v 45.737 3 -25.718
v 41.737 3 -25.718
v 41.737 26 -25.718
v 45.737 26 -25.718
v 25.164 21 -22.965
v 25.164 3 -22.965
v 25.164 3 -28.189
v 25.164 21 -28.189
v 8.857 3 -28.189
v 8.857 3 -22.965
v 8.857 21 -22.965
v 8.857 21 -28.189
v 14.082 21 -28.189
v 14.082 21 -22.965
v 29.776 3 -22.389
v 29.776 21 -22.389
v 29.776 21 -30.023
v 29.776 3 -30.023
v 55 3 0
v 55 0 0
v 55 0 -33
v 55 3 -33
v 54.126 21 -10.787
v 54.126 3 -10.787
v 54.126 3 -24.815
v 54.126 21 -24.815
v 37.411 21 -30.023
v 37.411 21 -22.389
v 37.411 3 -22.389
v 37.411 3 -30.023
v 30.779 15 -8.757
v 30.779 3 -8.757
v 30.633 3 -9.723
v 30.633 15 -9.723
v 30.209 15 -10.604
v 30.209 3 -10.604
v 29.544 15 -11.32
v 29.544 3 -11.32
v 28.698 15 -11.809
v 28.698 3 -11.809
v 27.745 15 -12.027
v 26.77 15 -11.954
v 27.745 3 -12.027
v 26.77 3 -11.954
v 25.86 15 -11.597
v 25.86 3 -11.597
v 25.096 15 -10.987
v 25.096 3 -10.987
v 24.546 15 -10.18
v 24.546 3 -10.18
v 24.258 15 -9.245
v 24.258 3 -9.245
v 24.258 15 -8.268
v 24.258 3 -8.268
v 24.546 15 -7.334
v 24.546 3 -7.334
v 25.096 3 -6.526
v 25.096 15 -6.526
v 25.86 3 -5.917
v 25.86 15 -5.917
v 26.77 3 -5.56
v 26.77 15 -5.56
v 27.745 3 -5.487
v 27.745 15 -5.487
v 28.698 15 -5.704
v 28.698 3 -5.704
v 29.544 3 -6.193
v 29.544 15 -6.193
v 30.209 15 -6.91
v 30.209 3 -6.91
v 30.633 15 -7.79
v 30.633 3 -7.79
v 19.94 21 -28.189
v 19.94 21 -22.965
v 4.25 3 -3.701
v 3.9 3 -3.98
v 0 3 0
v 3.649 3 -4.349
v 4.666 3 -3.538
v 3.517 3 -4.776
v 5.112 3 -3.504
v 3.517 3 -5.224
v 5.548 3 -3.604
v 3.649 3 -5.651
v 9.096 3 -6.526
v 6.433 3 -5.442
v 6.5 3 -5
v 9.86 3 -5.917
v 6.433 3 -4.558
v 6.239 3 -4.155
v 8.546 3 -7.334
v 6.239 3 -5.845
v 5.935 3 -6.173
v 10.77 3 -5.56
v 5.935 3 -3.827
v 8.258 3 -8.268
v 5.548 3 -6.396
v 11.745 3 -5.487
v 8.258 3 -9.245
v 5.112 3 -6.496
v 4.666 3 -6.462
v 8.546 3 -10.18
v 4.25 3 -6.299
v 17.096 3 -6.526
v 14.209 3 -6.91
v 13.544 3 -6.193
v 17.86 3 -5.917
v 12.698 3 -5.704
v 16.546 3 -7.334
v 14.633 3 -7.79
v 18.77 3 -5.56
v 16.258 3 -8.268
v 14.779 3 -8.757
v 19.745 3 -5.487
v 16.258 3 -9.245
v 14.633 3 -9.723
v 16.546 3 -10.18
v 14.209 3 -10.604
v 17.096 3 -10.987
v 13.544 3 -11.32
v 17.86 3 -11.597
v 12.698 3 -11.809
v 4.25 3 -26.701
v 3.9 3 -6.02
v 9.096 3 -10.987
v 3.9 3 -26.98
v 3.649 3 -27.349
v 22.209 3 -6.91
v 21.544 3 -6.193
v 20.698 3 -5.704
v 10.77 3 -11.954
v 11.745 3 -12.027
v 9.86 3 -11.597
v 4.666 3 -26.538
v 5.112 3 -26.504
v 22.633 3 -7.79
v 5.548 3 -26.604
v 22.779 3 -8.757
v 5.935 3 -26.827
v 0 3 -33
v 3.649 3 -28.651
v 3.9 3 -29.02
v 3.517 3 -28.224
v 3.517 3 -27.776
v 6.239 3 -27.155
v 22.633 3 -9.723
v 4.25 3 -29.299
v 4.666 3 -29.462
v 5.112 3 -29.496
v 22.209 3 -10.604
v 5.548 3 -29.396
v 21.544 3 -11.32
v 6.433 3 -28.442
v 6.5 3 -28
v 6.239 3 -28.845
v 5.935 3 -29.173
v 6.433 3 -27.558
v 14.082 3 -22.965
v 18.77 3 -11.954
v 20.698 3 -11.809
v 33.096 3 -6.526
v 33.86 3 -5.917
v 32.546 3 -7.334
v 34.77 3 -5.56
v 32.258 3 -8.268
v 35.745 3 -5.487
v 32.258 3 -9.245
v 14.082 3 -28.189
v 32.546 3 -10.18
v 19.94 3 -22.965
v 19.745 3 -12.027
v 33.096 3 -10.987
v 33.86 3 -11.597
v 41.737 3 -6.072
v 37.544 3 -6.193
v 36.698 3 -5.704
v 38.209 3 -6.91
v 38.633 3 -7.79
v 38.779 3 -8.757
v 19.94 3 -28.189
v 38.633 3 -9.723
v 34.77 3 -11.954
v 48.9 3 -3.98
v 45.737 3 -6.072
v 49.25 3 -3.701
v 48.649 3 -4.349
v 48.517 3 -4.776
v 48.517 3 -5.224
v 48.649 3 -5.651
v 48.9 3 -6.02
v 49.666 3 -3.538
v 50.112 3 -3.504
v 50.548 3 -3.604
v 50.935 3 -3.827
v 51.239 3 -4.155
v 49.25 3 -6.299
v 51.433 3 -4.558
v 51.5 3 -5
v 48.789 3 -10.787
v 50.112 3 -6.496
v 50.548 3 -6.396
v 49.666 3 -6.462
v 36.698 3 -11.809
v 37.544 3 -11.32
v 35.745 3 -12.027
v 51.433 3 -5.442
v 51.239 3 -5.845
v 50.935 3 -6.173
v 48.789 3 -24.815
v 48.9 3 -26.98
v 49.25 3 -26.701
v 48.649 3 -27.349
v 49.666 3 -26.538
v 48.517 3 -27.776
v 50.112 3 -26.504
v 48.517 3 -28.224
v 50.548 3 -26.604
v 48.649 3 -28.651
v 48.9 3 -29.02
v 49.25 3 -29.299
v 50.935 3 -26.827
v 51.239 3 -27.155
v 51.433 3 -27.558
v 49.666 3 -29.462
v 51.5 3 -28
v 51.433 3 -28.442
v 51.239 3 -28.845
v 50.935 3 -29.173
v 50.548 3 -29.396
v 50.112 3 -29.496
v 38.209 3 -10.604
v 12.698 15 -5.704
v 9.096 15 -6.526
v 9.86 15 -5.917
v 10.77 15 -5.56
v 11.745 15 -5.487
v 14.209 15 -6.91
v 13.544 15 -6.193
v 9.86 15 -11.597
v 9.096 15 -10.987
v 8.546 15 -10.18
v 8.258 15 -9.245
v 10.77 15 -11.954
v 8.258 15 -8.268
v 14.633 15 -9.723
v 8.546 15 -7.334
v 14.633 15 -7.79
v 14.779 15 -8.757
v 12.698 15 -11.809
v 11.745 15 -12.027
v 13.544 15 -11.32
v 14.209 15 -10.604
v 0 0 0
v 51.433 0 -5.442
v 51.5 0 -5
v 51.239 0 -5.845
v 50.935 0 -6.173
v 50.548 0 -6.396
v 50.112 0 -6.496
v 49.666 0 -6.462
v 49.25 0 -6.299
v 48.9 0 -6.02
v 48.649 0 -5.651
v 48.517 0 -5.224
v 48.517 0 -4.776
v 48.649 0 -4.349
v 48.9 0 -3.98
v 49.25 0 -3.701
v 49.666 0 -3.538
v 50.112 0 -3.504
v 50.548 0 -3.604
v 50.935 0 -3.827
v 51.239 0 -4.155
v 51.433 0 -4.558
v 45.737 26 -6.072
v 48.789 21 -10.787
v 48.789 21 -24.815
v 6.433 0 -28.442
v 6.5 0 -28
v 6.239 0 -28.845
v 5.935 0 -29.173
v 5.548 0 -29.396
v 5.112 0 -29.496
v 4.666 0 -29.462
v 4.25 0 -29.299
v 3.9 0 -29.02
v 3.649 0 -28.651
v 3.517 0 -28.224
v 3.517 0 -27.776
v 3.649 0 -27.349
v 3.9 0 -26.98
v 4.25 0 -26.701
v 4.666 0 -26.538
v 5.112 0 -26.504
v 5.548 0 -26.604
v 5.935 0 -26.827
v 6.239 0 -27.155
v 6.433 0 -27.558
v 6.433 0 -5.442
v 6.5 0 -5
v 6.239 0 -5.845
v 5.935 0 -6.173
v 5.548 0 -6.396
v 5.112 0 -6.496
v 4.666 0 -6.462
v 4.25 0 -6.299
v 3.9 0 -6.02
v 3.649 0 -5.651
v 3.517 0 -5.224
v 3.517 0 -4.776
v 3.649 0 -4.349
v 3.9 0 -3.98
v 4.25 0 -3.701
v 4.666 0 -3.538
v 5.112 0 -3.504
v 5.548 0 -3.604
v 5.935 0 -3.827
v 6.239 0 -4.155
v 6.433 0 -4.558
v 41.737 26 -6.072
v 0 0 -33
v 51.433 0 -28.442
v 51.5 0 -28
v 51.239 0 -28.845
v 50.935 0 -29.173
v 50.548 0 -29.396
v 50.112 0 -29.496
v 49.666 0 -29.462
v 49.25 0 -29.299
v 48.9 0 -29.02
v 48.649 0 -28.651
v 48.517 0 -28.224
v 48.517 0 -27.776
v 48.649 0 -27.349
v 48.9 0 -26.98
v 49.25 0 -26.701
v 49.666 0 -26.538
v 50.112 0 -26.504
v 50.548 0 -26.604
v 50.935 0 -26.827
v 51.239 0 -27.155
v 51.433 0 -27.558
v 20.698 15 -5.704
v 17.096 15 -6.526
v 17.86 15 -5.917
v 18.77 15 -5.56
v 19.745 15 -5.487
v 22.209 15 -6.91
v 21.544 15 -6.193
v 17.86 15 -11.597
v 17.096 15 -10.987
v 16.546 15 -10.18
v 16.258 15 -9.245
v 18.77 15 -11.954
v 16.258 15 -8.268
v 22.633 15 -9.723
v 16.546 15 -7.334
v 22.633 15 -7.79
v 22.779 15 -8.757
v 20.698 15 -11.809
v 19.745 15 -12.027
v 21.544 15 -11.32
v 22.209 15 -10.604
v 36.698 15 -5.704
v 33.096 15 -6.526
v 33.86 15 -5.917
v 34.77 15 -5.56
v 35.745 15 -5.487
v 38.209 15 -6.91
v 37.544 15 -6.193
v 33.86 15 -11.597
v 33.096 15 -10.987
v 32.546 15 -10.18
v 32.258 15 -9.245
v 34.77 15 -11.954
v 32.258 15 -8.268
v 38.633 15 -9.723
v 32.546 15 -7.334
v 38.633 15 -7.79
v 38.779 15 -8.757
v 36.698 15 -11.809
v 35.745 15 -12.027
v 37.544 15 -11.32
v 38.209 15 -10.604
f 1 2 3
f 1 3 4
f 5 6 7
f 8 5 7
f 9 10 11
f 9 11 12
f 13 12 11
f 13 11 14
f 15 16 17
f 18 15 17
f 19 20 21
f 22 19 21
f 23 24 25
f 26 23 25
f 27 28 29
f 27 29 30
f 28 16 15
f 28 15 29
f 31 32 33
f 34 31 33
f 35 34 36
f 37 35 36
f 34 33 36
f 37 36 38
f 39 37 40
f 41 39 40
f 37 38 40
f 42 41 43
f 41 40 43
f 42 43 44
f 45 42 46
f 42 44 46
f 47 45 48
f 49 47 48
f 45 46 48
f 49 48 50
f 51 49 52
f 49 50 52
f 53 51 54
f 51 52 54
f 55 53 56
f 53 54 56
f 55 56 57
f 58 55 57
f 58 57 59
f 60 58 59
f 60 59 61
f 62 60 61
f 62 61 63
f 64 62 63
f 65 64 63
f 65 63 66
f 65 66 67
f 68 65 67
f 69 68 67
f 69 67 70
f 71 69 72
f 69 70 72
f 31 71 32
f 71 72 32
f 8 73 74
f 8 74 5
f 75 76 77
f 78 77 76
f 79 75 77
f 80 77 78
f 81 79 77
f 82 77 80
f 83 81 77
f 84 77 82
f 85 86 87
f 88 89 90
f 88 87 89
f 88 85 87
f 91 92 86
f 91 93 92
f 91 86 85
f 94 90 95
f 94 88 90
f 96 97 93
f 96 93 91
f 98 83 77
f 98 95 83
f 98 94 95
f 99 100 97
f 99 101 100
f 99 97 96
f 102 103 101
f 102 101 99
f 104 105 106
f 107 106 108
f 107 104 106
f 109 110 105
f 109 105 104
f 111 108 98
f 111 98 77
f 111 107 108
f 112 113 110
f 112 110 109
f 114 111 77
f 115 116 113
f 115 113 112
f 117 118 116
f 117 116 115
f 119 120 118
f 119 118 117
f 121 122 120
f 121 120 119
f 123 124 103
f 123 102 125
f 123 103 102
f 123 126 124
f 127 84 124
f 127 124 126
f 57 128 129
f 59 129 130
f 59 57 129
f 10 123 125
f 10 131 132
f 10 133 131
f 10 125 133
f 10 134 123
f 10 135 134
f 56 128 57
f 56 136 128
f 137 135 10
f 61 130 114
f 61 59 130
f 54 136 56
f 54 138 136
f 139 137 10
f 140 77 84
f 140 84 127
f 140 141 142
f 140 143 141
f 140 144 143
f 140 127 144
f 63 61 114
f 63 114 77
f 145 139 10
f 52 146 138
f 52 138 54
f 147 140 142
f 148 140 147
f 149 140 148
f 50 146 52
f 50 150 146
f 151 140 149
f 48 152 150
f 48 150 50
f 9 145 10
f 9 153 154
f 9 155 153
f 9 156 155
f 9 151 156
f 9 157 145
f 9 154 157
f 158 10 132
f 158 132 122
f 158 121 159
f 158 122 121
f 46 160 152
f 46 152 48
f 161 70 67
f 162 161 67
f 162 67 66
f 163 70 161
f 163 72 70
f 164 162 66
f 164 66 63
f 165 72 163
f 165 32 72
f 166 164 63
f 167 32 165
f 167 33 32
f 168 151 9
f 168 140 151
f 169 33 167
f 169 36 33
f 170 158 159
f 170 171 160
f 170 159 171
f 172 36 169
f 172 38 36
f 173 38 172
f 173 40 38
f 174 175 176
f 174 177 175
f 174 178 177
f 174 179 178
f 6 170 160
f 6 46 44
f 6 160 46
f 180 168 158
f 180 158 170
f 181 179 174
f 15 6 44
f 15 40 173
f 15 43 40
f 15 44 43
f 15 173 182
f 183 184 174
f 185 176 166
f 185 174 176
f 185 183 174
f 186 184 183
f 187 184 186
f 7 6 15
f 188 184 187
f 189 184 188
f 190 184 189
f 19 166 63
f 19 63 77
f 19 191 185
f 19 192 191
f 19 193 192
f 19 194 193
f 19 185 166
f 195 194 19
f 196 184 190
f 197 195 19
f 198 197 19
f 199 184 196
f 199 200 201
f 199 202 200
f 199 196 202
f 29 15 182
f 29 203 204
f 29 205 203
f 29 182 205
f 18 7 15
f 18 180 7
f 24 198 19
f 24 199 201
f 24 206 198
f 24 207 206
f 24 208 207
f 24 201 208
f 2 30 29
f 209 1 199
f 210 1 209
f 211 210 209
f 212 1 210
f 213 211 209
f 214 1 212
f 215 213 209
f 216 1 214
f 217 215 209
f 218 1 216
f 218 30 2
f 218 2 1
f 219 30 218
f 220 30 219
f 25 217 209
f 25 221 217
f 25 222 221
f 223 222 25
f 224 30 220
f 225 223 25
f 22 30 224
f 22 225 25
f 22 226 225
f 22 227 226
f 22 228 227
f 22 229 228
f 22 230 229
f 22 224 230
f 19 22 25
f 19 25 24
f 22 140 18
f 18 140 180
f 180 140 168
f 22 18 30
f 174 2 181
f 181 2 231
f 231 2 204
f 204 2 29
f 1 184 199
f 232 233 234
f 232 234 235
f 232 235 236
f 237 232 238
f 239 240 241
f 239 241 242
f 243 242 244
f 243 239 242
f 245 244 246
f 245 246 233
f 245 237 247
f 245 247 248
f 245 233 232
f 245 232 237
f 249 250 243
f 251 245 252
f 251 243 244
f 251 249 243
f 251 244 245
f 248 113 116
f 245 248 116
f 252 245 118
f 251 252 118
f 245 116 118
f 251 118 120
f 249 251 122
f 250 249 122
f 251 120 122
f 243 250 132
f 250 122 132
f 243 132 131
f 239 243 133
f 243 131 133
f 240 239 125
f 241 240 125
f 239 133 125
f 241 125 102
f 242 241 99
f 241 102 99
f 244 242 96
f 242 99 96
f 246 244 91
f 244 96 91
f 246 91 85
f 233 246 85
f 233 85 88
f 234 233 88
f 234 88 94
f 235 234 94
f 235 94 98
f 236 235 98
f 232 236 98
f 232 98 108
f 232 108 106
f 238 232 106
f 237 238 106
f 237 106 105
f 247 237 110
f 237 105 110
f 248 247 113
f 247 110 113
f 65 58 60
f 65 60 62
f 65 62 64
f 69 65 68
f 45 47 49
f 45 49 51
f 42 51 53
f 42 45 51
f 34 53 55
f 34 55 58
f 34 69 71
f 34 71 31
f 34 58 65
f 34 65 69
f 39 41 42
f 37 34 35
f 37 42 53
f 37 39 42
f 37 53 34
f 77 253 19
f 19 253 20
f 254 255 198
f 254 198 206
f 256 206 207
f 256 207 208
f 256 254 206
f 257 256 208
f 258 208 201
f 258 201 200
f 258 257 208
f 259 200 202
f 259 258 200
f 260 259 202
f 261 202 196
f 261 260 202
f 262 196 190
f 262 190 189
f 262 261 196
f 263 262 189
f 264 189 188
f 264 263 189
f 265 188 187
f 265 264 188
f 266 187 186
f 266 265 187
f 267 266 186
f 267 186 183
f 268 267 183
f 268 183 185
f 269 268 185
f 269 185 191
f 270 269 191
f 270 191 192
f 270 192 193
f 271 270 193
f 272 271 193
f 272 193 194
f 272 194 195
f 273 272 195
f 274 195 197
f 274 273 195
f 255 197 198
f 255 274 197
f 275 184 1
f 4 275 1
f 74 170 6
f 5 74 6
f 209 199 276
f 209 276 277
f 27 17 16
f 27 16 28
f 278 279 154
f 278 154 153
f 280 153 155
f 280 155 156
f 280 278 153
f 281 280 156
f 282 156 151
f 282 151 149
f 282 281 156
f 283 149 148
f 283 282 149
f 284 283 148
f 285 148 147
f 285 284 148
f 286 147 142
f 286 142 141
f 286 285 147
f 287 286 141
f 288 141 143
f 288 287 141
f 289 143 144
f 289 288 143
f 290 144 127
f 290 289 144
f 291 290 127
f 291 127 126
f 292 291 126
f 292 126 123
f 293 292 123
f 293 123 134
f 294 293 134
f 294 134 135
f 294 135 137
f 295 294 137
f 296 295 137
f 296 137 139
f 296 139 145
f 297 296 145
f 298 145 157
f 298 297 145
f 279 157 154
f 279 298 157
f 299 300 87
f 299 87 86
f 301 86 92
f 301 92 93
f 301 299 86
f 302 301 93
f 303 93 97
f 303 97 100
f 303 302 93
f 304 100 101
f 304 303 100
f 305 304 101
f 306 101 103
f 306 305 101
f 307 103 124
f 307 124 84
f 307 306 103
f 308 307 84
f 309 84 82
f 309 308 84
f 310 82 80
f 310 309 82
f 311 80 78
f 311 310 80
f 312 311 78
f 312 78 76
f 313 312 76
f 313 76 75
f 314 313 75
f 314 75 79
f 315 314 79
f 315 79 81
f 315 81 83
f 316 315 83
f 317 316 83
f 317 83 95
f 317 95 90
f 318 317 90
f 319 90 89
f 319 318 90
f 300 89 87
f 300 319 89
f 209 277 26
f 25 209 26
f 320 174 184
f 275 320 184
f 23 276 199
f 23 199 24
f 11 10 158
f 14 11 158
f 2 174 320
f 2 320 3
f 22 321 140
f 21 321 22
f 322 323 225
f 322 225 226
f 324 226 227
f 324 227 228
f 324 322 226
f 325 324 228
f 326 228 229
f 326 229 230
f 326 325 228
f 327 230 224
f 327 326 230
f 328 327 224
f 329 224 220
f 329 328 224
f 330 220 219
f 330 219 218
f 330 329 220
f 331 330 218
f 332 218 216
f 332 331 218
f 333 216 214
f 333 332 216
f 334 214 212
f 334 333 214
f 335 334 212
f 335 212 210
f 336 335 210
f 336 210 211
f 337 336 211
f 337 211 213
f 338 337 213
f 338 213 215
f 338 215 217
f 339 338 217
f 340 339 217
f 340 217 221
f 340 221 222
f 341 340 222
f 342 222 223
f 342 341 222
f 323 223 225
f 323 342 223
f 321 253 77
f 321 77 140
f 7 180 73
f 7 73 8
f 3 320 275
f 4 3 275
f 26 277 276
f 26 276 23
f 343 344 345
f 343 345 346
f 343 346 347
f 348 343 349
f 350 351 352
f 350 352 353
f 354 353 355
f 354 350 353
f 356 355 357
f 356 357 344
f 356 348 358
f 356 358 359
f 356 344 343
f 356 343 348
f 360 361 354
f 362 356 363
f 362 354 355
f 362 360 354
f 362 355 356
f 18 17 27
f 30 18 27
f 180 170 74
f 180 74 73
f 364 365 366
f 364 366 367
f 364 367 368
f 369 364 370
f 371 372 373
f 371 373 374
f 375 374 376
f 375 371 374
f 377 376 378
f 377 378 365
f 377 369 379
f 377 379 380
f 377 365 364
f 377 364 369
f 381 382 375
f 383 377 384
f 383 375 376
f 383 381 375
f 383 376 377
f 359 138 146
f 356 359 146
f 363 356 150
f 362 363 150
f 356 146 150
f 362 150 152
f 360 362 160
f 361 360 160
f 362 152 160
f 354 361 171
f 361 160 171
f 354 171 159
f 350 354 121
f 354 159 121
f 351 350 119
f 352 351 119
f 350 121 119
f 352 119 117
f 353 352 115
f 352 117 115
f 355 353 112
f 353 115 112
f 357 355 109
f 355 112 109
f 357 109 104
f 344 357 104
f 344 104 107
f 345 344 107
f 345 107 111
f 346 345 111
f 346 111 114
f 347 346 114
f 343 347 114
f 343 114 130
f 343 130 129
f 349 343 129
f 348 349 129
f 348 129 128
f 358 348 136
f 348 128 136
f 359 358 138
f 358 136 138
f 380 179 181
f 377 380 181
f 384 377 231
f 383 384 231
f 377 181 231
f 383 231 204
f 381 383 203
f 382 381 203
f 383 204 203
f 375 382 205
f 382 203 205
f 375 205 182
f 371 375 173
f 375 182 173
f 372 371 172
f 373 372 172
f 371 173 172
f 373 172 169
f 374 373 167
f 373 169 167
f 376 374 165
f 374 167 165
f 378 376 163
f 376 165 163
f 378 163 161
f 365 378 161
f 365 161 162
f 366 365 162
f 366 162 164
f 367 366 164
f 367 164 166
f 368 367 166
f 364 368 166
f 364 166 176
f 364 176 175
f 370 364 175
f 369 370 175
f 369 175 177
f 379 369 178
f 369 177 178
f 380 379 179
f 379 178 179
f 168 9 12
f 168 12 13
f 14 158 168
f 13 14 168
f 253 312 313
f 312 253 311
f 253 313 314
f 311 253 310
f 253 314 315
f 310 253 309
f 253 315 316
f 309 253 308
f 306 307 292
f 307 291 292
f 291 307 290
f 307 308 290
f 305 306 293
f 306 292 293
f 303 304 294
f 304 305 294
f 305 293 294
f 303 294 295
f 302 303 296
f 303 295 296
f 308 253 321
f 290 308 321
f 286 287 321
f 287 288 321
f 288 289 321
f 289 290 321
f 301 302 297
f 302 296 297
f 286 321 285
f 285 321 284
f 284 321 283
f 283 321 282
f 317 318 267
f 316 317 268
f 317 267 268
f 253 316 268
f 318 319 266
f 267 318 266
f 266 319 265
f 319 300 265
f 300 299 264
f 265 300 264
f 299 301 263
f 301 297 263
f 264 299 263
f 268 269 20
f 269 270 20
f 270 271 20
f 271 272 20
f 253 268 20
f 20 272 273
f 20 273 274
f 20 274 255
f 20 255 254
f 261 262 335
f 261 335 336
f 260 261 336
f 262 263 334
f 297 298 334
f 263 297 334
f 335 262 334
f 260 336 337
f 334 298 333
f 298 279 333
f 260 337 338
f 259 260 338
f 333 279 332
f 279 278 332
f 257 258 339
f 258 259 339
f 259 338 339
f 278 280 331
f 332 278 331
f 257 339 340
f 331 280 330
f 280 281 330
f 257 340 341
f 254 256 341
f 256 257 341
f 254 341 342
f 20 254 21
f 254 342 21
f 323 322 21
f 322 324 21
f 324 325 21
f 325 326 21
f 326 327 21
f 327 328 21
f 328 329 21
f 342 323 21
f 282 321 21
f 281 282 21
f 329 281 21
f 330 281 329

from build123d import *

# Parameters (mm, degrees)
ESQUISSE1_W      = 55
ESQUISSE1_H      = 33
ESQUISSE1_R      = 1.5
EXTRUSION1_DEPTH = 3
ESQUISSE2_W      = 7.634201779
ESQUISSE2_H      = 7.63420178
ESQUISSE2_W_2    = 5.337752956
ESQUISSE2_H_2    = 14.027301674
ESQUISSE2_W_3    = 5.224355128
ESQUISSE2_H_3    = 5.224355128
EXTRUSION2_DEPTH = 18
ESQUISSE3_R      = 3.279080348
EXTRUSION3_DEPTH = 12
ESQUISSE4_W      = 4
ESQUISSE4_H      = 19.646099489
EXTRUSION4_DEPTH = 23


with BuildPart() as part:
    # Esquisse1 → Extrusion1 (new body)
    with BuildSketch(Plane(origin=(0, 0, 0), x_dir=(1, 0, 0), z_dir=(0, 1, 0))):
        with Locations((27.5, 16.5)):
            Rectangle(ESQUISSE1_W, ESQUISSE1_H)
        with Locations((5, 28)):
            Circle(ESQUISSE1_R, mode=Mode.SUBTRACT)
        with Locations((50, 28)):
            Circle(ESQUISSE1_R, mode=Mode.SUBTRACT)
        with Locations((50, 5)):
            Circle(ESQUISSE1_R, mode=Mode.SUBTRACT)
        with Locations((5, 5)):
            Circle(ESQUISSE1_R, mode=Mode.SUBTRACT)
    extrude(amount=EXTRUSION1_DEPTH)

    # Esquisse2 → Extrusion2 (add)
    with BuildSketch(Plane(origin=(0, 3, 0), x_dir=(1, 0, 0), z_dir=(0, 1, 0))):
        with Locations((33.593446124, 26.205676479)):
            Rectangle(ESQUISSE2_W, ESQUISSE2_H)
        with Locations((51.457386868, 17.801055276)):
            Rectangle(ESQUISSE2_W_2, ESQUISSE2_H_2)
        with Locations((11.46939236, 25.577155504)):
            Rectangle(ESQUISSE2_W_3, ESQUISSE2_H_3)
        with Locations((22.552159567, 25.577155504)):
            Rectangle(ESQUISSE2_W_3, ESQUISSE2_H_3)
    extrude(amount=EXTRUSION2_DEPTH)

    # Esquisse3 → Extrusion3 (add)
    with BuildSketch(Plane(origin=(0, 3, 0), x_dir=(1, 0, 0), z_dir=(0, 1, 0))):
        with Locations((11.5, 8.756763264)):
            Circle(ESQUISSE3_R)
        with Locations((19.5, 8.756763264)):
            Circle(ESQUISSE3_R)
        with Locations((27.5, 8.756763264)):
            Circle(ESQUISSE3_R)
        with Locations((35.5, 8.756763264)):
            Circle(ESQUISSE3_R)
    extrude(amount=EXTRUSION3_DEPTH)

    # Esquisse4 → Extrusion4 (add)
    with BuildSketch(Plane(origin=(0, 3, 0), x_dir=(1, 0, 0), z_dir=(0, 1, 0))):
        with Locations((43.737455539, 15.895279312)):
            Rectangle(ESQUISSE4_W, ESQUISSE4_H)
    extrude(amount=EXTRUSION4_DEPTH)


solid = part.part
